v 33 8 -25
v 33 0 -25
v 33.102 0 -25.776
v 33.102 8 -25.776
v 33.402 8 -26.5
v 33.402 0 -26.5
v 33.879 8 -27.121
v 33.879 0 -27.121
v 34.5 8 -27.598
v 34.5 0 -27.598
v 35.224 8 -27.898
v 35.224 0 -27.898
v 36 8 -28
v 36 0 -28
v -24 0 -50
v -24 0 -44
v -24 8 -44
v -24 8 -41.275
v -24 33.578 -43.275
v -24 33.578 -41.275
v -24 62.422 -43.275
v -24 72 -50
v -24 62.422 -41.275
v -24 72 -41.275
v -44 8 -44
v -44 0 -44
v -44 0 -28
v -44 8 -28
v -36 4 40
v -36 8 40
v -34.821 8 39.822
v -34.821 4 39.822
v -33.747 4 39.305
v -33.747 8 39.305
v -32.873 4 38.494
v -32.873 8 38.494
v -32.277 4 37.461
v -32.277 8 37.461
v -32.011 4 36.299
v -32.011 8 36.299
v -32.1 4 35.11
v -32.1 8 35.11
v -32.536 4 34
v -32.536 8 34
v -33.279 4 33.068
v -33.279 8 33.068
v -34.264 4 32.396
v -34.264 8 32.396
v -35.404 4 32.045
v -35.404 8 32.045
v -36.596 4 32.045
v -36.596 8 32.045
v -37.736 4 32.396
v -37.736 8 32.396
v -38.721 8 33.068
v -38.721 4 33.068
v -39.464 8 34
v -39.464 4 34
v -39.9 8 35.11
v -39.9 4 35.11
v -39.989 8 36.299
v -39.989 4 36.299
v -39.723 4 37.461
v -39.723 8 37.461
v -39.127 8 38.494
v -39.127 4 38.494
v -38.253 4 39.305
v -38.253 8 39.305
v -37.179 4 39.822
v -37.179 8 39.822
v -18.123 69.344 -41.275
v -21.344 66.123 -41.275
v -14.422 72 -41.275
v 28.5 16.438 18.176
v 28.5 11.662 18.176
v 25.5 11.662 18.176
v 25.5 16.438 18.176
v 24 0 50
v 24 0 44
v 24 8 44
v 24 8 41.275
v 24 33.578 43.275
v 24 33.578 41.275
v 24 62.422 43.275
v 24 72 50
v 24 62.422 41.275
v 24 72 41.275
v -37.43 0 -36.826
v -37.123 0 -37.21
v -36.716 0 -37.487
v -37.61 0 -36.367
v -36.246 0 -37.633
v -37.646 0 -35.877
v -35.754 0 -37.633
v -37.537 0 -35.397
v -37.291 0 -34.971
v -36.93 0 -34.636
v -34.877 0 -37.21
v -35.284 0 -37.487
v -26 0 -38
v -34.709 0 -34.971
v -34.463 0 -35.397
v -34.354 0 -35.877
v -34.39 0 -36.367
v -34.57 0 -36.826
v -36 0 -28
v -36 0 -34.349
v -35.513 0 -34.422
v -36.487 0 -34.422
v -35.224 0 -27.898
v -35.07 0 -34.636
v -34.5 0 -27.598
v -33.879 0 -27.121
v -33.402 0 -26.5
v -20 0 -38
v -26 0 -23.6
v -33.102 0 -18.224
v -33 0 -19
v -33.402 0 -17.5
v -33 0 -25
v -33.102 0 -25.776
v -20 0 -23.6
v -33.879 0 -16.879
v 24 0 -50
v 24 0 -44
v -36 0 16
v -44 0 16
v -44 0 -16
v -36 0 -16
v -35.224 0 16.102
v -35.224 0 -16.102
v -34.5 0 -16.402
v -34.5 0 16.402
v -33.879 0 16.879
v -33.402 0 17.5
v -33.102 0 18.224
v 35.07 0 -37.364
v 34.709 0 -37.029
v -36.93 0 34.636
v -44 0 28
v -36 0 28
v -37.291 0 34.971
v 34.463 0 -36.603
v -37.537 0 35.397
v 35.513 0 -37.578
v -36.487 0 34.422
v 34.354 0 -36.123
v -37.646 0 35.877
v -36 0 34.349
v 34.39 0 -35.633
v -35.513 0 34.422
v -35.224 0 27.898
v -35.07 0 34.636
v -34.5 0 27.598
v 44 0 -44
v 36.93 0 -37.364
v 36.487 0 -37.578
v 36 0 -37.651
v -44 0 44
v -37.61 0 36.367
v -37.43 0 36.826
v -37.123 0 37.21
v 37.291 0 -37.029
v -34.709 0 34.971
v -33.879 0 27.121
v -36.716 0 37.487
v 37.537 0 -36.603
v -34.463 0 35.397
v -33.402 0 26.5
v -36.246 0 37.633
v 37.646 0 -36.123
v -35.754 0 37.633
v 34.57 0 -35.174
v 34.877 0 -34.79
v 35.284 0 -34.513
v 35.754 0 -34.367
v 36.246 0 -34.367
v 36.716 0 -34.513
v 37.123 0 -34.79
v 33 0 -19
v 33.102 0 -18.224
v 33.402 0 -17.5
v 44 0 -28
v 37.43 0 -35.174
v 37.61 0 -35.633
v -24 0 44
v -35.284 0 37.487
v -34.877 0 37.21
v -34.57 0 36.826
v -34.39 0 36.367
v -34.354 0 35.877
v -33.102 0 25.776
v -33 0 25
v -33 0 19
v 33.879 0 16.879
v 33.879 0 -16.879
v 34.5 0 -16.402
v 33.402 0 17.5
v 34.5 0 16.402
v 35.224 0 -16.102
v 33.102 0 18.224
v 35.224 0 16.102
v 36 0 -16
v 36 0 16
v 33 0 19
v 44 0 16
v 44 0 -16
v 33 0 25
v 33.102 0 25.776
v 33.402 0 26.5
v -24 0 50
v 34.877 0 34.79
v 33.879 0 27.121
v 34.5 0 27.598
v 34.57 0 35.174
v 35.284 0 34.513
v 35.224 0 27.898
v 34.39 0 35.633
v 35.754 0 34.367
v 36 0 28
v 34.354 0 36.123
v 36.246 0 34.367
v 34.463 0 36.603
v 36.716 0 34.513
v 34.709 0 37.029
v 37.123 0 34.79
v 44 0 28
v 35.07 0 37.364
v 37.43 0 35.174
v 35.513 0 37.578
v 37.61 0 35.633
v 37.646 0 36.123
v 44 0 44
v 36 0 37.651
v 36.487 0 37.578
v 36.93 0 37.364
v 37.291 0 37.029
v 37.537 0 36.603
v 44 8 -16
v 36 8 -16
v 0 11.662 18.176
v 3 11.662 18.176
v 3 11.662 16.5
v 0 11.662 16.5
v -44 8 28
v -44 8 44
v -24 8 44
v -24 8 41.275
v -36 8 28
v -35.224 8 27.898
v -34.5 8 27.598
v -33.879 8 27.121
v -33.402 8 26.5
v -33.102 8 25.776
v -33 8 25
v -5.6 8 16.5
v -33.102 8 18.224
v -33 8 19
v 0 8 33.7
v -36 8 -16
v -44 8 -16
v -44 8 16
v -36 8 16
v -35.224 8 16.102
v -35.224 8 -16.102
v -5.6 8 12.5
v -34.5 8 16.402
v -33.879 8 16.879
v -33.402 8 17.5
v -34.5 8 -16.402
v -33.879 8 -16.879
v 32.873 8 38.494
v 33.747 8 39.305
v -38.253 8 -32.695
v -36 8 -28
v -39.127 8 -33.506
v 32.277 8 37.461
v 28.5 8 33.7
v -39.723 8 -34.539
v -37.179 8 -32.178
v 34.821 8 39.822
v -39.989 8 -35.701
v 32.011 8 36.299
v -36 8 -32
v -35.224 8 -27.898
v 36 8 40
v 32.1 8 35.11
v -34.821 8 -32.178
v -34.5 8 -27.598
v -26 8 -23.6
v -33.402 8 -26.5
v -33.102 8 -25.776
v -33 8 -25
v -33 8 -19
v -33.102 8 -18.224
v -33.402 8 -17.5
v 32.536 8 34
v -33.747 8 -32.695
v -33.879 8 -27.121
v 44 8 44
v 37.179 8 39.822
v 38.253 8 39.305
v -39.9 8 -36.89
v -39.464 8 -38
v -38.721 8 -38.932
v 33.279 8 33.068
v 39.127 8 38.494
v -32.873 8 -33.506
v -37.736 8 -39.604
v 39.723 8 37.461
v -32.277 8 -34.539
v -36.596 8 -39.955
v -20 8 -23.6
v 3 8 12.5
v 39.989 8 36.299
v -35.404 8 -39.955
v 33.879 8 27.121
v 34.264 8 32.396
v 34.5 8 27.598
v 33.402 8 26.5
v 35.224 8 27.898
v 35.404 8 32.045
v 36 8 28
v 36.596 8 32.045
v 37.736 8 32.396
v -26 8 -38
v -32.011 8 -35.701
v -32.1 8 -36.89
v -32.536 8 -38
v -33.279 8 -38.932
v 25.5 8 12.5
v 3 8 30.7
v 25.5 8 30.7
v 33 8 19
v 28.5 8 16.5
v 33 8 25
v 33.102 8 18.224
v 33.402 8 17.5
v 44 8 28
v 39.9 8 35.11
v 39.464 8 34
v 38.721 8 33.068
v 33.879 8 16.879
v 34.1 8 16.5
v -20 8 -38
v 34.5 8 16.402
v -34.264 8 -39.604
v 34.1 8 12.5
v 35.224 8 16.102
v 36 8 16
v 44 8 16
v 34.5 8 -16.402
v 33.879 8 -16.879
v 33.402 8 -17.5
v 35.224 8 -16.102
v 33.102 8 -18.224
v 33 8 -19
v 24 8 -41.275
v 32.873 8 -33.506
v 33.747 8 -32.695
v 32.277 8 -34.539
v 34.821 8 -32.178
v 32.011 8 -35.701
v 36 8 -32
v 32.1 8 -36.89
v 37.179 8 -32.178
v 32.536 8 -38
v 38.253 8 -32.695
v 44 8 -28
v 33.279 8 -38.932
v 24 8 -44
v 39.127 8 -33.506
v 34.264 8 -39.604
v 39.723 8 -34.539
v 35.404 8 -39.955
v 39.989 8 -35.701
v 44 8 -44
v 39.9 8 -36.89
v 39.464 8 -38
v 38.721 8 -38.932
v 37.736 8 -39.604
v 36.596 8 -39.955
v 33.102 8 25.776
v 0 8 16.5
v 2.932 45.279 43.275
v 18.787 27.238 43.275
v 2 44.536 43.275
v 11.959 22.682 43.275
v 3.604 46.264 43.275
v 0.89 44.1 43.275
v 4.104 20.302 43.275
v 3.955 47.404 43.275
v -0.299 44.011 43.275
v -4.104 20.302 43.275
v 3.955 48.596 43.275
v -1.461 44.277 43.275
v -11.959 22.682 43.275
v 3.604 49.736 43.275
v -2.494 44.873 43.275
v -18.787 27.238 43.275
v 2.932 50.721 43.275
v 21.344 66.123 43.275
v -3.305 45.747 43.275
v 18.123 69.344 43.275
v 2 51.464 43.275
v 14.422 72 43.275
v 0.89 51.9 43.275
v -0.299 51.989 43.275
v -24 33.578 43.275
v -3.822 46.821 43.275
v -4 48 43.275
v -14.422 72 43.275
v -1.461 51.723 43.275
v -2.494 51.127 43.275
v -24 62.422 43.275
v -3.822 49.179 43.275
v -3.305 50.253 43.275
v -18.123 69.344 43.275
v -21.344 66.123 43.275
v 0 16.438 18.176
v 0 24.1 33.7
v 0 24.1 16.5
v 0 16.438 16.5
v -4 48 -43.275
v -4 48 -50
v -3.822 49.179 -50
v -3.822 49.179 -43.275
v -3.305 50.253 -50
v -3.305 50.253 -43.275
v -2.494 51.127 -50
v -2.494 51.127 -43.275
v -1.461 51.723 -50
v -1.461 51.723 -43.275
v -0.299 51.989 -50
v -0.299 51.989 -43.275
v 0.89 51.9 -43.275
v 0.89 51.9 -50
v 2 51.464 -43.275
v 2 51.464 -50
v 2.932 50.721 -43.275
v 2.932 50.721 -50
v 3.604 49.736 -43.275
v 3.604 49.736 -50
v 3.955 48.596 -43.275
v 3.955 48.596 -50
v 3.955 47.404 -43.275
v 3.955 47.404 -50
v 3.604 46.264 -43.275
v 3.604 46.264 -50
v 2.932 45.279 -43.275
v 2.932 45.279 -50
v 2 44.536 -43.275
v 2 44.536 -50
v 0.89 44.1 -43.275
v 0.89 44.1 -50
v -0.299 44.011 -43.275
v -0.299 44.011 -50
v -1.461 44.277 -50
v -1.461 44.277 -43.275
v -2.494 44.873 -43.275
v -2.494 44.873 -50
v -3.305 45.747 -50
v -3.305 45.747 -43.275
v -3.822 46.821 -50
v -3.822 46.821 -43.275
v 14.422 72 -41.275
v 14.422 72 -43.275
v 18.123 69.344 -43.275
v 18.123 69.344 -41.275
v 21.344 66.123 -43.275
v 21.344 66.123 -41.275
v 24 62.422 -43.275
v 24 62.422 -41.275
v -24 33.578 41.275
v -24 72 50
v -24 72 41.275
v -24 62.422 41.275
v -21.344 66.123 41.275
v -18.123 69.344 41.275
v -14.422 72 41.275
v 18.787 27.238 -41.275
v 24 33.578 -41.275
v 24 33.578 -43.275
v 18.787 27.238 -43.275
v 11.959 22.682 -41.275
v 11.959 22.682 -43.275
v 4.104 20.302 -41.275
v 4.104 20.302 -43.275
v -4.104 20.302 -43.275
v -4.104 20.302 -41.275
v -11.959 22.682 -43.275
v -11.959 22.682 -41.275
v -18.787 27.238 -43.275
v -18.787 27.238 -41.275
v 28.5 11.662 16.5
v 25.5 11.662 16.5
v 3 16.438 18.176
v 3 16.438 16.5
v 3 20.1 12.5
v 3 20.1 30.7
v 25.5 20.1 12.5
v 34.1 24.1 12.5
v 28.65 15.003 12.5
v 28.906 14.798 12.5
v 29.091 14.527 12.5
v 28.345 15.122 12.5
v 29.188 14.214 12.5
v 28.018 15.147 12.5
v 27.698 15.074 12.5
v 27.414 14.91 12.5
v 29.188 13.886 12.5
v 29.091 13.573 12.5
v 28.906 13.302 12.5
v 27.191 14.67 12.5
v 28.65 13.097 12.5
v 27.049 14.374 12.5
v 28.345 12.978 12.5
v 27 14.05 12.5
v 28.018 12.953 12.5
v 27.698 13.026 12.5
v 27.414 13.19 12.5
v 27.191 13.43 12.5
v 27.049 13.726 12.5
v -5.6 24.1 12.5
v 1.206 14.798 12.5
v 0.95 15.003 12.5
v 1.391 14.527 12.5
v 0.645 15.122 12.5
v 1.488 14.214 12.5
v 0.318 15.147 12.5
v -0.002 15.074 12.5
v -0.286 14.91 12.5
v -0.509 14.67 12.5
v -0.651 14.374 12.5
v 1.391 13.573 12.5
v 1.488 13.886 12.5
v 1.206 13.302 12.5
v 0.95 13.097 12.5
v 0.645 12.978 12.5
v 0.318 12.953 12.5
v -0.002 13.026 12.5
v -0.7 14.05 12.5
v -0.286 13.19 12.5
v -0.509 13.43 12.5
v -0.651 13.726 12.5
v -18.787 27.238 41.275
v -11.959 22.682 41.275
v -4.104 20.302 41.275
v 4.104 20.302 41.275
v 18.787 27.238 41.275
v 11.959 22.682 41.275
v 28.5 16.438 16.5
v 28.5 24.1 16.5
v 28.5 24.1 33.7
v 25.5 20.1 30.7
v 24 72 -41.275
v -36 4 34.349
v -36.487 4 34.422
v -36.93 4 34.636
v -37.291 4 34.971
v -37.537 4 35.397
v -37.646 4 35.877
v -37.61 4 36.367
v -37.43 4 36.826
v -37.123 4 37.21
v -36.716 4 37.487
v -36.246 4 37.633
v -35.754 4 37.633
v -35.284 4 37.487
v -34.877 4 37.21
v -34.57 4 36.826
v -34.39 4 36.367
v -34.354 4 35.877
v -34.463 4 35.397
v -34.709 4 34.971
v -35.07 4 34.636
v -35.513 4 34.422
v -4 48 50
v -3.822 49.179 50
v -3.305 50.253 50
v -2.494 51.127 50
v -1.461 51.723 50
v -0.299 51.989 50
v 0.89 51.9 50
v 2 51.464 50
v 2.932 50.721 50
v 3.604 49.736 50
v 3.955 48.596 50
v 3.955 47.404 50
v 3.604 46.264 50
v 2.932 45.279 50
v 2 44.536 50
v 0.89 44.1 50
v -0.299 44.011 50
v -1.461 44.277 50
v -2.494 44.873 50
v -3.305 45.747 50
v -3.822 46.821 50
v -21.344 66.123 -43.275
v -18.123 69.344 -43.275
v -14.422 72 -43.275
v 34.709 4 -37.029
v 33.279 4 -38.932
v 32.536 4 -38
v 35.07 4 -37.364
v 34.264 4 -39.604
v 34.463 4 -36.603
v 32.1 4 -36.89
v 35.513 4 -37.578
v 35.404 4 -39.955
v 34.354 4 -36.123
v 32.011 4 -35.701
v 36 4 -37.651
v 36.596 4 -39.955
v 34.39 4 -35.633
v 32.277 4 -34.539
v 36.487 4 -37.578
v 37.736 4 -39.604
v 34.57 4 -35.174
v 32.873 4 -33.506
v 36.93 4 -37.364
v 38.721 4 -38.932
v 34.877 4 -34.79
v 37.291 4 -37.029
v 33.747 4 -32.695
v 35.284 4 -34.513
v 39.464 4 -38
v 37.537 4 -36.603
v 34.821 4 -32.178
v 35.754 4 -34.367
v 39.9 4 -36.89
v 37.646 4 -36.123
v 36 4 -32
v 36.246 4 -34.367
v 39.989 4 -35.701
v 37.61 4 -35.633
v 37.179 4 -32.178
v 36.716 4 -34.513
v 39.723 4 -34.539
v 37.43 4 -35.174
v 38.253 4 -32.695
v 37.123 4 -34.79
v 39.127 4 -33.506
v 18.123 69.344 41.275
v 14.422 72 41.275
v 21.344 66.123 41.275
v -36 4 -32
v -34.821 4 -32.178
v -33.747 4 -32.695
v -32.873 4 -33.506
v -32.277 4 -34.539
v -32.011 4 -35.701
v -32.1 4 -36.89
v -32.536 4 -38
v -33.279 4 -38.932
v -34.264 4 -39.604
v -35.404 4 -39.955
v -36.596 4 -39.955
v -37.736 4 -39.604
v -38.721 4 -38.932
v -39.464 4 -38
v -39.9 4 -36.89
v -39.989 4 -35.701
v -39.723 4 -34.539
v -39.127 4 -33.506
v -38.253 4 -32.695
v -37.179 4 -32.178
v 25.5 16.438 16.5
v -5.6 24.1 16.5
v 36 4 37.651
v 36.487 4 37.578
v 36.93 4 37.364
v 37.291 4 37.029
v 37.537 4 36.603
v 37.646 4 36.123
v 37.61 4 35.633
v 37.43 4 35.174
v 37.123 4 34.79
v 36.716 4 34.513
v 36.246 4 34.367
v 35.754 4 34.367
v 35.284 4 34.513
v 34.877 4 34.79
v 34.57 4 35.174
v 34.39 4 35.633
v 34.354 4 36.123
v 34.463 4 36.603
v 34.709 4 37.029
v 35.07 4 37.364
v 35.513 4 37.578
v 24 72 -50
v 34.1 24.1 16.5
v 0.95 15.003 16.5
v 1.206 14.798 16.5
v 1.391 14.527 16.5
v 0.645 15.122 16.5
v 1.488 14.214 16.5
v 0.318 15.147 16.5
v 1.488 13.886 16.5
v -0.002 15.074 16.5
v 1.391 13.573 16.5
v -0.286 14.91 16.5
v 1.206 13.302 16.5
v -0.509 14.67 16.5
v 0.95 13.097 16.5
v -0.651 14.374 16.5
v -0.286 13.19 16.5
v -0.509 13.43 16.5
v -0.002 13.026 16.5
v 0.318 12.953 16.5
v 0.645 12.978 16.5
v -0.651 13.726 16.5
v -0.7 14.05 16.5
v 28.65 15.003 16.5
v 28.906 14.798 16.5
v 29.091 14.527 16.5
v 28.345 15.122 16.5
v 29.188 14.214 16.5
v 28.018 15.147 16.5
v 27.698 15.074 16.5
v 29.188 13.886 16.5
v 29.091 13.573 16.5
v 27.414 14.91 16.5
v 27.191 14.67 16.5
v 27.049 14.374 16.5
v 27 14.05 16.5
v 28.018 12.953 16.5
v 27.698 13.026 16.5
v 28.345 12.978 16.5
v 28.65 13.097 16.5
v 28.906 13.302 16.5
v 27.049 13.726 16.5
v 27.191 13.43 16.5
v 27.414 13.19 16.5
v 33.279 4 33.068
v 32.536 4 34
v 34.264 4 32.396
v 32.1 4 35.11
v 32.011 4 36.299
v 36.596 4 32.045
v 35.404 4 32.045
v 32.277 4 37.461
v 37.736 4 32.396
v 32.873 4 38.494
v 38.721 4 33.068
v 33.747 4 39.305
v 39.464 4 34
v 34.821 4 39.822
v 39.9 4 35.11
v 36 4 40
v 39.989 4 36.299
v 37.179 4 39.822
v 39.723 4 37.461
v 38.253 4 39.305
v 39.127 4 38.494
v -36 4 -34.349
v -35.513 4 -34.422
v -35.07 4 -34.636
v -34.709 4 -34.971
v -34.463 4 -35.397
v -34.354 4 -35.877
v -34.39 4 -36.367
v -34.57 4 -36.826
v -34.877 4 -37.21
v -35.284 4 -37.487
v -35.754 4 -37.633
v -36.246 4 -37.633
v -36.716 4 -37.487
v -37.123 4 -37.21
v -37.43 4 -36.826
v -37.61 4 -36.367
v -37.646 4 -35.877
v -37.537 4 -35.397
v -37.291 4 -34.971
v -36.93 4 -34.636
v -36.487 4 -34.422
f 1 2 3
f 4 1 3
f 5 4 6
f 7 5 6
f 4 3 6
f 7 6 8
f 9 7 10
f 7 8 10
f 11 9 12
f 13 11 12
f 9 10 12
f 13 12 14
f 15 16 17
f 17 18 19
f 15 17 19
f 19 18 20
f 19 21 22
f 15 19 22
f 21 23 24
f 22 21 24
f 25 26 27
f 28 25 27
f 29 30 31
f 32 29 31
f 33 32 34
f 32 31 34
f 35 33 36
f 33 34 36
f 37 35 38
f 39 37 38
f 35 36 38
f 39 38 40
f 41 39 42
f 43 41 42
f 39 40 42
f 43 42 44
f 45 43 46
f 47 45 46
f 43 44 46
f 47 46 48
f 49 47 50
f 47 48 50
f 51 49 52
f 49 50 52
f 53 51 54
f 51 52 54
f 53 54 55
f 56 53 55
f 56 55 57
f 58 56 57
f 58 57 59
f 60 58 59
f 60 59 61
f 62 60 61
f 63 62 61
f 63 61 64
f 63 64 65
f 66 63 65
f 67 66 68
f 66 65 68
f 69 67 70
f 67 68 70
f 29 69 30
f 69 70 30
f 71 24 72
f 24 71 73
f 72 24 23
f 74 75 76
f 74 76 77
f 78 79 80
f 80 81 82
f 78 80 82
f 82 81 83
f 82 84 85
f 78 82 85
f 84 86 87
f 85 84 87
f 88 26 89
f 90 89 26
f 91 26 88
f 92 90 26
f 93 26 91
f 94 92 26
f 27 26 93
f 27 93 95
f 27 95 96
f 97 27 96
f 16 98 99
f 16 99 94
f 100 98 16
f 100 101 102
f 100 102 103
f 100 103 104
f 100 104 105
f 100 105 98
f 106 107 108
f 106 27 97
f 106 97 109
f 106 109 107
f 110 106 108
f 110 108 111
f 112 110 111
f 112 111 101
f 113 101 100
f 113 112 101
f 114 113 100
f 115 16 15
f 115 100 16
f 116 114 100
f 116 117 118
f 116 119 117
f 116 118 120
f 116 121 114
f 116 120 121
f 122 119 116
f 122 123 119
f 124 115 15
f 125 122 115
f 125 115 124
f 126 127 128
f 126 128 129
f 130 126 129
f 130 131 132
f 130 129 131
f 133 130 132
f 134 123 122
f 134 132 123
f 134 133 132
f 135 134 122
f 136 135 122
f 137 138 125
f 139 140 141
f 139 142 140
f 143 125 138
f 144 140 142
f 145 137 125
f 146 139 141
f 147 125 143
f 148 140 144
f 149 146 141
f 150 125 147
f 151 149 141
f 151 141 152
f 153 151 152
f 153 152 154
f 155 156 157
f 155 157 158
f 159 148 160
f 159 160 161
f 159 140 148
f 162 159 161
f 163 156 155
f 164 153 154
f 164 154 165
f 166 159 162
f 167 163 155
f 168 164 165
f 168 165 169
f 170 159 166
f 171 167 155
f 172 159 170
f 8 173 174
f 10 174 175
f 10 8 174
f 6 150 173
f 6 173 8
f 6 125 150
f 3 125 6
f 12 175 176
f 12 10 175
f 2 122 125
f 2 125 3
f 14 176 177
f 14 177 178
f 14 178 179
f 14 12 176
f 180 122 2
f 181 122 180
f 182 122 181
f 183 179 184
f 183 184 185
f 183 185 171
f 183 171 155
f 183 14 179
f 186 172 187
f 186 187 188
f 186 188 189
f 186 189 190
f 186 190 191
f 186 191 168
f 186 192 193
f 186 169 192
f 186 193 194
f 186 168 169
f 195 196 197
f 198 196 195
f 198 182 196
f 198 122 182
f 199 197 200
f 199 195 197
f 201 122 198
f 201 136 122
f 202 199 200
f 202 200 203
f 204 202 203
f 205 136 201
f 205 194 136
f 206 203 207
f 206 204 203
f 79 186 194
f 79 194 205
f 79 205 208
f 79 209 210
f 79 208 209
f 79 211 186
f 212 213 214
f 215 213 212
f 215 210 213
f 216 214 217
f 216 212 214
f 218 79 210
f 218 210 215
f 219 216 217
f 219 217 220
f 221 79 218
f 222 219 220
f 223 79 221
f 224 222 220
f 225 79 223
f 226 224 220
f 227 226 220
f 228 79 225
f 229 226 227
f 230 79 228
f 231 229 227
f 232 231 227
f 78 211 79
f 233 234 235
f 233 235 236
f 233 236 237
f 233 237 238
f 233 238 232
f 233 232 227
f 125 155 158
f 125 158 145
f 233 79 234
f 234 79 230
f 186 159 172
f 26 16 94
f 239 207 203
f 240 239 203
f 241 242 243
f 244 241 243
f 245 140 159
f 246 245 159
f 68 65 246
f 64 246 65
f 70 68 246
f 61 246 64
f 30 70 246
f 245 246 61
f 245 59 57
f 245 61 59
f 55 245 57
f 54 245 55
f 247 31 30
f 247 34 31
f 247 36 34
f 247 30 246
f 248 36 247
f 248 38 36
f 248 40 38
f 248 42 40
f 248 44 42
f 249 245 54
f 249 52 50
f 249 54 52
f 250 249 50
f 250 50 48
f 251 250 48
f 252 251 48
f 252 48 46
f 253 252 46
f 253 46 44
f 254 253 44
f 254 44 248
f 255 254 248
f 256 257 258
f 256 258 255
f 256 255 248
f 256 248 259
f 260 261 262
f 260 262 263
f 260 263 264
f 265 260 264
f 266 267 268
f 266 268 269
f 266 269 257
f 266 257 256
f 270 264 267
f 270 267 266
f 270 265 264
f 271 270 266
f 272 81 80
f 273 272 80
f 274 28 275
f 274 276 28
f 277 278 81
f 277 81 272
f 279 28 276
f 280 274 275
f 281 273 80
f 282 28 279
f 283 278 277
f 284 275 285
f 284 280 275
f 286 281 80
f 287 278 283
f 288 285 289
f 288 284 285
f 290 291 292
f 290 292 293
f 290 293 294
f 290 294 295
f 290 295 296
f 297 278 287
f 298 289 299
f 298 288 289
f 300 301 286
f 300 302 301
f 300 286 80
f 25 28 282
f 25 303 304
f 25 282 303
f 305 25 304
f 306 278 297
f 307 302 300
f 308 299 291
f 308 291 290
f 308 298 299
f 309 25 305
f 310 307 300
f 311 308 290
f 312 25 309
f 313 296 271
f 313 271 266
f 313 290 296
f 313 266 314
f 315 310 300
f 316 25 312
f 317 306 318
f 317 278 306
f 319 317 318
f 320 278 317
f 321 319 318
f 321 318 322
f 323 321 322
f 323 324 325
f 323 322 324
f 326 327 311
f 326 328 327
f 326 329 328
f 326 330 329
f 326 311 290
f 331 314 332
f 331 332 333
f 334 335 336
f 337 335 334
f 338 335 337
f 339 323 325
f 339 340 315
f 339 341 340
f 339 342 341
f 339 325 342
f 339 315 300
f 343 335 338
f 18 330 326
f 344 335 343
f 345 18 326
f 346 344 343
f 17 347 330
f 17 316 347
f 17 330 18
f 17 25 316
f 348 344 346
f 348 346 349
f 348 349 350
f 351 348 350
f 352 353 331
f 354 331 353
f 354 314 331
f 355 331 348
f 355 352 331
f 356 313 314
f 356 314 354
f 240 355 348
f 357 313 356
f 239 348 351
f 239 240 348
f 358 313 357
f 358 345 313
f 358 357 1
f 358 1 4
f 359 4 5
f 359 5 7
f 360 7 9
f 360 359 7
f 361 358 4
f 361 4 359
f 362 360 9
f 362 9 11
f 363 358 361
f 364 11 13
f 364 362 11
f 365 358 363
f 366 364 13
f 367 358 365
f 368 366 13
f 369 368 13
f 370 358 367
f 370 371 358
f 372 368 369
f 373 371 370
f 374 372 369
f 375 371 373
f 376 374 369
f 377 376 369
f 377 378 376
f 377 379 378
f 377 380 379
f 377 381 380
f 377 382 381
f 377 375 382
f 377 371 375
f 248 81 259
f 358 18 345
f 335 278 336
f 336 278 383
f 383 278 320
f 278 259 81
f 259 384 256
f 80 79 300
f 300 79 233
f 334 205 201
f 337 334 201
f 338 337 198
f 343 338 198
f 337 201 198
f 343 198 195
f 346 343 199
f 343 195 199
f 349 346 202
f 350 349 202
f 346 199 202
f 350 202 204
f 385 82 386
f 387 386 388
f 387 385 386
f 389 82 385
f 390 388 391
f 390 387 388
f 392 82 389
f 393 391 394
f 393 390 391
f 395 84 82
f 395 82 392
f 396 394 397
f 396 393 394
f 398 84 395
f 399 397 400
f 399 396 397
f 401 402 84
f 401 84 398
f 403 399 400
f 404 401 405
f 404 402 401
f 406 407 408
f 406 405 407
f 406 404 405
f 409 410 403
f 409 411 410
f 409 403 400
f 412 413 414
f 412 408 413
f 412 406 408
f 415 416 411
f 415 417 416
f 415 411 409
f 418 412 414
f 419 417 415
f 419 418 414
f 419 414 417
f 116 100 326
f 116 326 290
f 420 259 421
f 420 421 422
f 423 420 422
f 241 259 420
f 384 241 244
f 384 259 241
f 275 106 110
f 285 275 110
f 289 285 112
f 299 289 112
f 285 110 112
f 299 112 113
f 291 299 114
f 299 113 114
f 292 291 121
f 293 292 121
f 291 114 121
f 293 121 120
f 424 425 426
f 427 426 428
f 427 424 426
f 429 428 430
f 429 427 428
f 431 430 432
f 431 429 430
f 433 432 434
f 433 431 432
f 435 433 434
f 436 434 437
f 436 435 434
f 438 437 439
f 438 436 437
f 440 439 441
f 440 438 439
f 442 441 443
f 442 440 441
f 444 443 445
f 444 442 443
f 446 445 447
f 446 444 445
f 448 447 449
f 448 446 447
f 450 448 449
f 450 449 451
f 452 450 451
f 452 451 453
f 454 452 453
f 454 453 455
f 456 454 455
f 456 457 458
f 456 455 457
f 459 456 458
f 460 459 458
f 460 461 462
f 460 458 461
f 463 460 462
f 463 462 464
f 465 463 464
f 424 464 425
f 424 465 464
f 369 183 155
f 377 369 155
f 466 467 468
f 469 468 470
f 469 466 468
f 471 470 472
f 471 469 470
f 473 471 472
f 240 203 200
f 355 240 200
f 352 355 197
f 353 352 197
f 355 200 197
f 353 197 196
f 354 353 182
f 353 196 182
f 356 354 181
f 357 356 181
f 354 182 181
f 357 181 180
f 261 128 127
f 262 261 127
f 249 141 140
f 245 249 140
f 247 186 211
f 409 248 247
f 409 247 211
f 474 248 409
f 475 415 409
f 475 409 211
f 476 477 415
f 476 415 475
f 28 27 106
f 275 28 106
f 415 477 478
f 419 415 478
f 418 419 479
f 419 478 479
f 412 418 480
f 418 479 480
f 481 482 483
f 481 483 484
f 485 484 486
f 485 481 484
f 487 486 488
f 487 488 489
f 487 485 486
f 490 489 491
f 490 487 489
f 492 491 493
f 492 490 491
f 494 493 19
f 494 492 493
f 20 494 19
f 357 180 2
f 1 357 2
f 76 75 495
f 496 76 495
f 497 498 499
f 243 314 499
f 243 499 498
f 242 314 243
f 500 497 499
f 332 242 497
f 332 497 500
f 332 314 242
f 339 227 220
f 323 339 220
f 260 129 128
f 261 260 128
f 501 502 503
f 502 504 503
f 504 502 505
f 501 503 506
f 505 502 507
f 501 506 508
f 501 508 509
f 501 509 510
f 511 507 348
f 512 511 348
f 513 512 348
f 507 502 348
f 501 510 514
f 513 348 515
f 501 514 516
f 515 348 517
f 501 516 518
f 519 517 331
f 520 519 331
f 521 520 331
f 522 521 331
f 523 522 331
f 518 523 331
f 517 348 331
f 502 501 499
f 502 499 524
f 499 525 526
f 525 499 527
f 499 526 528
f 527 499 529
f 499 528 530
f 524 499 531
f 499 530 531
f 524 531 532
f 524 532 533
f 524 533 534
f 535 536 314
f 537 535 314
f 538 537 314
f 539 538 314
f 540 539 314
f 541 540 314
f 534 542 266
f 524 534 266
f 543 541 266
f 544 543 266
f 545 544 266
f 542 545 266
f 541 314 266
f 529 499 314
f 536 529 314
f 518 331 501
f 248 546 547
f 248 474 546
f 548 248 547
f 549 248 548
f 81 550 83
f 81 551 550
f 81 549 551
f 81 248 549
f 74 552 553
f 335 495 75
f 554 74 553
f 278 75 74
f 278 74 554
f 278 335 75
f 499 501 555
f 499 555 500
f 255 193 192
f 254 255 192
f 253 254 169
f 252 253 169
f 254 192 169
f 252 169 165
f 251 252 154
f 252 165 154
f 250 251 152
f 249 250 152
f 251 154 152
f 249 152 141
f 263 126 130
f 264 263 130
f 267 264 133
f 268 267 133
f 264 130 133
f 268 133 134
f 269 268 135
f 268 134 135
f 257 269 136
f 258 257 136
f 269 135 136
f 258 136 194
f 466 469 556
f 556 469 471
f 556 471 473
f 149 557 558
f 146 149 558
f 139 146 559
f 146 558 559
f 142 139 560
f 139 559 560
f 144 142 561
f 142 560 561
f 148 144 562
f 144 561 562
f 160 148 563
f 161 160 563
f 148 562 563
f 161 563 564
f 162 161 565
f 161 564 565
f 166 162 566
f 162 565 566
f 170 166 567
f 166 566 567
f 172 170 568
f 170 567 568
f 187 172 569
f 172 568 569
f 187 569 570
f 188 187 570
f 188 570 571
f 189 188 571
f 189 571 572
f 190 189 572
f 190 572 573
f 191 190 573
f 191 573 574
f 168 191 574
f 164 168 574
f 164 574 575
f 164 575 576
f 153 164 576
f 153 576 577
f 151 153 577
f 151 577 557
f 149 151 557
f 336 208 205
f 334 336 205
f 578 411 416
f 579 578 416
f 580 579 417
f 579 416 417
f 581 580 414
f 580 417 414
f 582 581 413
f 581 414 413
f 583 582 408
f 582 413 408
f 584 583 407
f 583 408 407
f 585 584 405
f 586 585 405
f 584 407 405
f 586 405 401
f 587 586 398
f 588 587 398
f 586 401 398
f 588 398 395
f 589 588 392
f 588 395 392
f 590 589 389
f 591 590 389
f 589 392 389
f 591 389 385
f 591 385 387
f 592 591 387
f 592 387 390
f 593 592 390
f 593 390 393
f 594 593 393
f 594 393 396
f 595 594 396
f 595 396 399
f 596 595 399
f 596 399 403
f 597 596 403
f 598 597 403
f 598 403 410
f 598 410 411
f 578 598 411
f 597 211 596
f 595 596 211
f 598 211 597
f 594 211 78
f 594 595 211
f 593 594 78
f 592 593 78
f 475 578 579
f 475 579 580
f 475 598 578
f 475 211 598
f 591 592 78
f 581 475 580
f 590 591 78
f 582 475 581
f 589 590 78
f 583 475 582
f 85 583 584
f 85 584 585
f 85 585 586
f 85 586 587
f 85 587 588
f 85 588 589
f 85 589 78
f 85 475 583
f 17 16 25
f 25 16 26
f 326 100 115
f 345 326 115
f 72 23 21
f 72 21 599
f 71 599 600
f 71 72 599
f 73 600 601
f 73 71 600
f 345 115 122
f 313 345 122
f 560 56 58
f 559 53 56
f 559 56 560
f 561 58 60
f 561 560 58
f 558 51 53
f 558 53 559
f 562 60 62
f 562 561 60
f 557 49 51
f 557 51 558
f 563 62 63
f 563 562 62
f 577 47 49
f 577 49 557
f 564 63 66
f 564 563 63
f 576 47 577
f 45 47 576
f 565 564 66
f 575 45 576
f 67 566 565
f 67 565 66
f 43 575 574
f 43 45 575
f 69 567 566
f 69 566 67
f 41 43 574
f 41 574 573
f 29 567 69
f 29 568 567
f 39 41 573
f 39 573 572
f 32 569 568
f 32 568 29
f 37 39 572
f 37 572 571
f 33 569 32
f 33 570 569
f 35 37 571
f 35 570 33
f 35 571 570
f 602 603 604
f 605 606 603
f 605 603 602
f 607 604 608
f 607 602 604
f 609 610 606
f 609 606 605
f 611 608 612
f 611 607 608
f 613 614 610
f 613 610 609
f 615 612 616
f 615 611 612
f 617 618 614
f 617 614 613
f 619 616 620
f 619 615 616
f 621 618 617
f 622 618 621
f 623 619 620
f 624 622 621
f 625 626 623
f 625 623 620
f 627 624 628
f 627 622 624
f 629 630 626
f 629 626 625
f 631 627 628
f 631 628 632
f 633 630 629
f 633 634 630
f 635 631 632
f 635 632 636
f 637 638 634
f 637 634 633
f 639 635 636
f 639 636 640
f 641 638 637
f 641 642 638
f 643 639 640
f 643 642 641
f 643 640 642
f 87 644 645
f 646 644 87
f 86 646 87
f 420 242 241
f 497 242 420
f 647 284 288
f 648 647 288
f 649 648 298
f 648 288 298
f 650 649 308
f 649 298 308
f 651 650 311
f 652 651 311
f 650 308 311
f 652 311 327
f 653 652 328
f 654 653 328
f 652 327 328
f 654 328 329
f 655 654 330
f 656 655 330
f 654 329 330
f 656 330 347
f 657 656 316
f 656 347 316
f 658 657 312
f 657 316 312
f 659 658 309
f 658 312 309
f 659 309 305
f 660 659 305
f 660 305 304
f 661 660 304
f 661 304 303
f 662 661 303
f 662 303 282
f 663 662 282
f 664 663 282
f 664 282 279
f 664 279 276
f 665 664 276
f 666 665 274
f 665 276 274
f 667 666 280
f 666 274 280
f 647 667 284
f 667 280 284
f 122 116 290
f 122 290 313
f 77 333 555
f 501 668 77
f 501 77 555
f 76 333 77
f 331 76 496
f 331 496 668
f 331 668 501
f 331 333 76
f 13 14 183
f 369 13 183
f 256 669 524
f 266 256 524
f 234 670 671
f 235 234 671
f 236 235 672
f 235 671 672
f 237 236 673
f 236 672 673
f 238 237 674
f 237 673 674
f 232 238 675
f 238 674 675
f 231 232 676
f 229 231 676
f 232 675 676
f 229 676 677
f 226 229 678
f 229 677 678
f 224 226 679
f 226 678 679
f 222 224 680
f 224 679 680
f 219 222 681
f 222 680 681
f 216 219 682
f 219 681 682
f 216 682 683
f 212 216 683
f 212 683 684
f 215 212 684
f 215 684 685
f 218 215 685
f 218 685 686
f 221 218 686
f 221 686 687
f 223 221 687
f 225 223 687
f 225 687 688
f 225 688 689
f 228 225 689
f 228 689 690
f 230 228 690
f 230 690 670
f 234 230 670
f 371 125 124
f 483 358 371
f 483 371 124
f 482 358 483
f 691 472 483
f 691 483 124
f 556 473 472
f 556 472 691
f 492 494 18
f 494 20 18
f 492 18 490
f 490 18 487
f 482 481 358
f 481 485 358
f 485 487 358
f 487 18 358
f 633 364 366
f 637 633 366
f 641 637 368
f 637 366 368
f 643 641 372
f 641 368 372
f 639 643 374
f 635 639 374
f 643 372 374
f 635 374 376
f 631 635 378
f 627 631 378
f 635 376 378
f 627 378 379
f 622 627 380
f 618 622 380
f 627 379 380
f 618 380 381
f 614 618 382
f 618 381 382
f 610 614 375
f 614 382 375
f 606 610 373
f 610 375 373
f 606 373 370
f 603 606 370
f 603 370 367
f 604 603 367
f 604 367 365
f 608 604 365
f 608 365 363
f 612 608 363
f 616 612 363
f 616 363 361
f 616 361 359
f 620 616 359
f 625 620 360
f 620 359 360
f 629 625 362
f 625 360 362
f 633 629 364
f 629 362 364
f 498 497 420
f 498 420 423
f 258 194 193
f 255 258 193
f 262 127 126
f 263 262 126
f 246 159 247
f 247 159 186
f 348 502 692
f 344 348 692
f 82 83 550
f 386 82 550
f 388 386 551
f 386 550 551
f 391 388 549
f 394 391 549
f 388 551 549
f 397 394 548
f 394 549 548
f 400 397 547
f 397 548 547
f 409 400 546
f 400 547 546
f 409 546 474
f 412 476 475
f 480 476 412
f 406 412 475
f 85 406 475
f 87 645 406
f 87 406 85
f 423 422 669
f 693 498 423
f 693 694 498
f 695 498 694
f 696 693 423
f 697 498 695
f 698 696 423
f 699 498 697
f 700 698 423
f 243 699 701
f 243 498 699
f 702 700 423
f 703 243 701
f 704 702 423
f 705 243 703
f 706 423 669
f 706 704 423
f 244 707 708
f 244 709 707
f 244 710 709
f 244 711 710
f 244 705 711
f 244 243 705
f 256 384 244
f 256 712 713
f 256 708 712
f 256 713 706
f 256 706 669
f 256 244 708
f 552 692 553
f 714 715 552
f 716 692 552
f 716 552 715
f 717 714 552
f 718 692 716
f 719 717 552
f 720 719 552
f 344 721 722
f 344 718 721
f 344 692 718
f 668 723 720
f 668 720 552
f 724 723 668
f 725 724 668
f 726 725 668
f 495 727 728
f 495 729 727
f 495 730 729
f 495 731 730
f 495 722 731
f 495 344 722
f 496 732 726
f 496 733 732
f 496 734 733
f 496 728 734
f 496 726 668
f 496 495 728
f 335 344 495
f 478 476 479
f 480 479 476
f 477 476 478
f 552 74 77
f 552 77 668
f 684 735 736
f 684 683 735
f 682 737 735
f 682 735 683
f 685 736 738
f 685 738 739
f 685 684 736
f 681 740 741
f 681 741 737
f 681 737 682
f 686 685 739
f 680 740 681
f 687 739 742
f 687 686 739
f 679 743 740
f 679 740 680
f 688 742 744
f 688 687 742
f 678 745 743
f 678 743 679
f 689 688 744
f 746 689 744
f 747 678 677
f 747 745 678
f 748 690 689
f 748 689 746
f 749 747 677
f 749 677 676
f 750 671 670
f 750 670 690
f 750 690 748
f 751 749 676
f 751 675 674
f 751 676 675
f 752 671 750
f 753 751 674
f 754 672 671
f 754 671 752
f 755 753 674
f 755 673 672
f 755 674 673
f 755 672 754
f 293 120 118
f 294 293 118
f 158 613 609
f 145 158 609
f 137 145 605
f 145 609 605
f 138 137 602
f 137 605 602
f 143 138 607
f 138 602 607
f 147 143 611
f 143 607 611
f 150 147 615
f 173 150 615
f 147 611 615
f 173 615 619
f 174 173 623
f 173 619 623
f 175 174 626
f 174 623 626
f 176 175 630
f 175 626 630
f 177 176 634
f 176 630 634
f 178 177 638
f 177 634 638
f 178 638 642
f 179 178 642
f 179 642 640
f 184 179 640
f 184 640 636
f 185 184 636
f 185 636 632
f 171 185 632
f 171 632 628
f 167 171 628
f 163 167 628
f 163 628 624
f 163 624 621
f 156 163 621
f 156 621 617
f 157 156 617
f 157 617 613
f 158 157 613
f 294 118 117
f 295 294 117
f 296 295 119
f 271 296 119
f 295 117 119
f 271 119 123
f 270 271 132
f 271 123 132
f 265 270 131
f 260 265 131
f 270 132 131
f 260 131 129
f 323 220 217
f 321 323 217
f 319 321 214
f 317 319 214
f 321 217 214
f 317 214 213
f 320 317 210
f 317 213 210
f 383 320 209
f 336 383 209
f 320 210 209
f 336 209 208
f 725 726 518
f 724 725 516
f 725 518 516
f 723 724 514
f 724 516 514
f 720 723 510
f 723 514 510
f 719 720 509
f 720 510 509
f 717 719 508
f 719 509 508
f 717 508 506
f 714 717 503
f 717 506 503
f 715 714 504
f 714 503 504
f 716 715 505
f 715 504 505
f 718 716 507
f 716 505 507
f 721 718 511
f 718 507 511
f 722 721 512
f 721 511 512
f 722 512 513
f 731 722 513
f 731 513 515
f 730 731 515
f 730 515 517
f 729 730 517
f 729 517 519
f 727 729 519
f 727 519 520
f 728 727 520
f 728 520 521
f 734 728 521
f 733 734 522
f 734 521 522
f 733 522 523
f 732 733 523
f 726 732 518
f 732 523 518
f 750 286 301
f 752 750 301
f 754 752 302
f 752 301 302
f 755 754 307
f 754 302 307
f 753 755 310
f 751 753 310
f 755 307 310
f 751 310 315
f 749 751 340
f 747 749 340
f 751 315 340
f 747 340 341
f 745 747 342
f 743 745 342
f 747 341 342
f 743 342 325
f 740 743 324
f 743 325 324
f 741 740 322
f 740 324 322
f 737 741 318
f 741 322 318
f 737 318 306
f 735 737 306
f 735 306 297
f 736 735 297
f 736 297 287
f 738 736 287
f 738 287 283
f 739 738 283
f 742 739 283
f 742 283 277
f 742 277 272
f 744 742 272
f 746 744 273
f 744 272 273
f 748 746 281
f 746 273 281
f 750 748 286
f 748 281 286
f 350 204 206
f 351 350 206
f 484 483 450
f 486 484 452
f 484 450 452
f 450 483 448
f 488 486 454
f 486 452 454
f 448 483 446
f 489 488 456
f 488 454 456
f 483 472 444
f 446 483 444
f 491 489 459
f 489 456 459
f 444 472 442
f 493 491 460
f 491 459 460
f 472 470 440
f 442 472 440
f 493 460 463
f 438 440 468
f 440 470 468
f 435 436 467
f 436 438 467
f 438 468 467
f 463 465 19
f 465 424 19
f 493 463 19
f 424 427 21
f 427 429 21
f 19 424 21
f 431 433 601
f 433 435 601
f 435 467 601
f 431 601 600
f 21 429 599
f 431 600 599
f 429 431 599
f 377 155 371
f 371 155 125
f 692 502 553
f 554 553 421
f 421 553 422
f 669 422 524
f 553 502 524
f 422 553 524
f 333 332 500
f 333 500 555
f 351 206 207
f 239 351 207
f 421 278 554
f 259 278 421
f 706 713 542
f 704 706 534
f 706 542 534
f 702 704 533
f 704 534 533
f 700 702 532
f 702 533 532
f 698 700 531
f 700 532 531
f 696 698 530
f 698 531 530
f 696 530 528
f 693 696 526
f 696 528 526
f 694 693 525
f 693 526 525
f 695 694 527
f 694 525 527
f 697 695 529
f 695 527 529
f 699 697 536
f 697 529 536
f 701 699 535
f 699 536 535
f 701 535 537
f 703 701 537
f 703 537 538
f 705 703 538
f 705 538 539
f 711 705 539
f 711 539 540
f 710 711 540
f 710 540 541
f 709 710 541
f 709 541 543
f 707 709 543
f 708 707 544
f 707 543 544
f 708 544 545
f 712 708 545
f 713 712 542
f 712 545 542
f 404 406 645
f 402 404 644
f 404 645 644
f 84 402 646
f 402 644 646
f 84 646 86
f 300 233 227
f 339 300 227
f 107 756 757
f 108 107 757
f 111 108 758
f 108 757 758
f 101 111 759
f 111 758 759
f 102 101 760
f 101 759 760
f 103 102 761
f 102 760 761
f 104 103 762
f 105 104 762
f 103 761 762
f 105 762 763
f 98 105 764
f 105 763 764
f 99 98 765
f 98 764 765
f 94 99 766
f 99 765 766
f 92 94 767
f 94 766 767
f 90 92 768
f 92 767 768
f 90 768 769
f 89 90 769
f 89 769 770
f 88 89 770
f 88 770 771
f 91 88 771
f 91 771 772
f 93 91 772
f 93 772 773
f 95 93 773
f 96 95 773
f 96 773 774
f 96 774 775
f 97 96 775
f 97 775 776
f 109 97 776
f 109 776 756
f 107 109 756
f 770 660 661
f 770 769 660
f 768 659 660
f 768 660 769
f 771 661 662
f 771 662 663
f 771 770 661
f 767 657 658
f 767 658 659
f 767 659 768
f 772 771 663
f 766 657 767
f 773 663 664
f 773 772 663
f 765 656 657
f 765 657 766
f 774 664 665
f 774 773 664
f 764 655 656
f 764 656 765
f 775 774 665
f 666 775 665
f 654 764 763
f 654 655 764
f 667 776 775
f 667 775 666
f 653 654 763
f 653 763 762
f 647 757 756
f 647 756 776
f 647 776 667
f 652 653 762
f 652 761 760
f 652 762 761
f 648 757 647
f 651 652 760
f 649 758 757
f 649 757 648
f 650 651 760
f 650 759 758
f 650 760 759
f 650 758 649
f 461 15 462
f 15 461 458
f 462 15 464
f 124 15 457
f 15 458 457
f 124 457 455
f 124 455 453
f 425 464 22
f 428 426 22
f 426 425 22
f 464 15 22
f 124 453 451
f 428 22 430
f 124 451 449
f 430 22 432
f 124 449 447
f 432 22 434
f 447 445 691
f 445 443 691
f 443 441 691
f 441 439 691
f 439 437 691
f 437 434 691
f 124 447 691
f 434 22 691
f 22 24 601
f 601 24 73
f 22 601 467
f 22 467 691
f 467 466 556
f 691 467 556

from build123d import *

# Parameters (mm, degrees)
BOSS_EXTRUDE1_DEPTH = 8
SKETCH2_R           = 1.651
CUT_EXTRUDE1_DEPTH  = 63.737548565
SKETCH3_R           = 4
CUT_EXTRUDE2_DEPTH  = 4
BOSS_EXTRUDE2_DEPTH = 12.1
BOSS_EXTRUDE3_DEPTH = 4
SKETCH6_R           = 1.1
CUT_EXTRUDE4_DEPTH  = 4
SKETCH7_W           = 1.6764
SKETCH7_H           = 4.7752
CUT_EXTRUDE5_DEPTH  = 89.164959026
SKETCH8_W           = 48
SKETCH8_H           = 2.725
BOSS_EXTRUDE4_DEPTH = 64
SKETCH9_W           = 48
SKETCH9_H           = 72
BOSS_EXTRUDE5_DEPTH = 6
SKETCH10_R          = 28
CUT_EXTRUDE6_DEPTH  = 2
SKETCH12_R          = 4
CUT_EXTRUDE7_DEPTH  = 126.778478386
SKETCH13_W          = 6
SKETCH13_H          = 14.4
CUT_EXTRUDE8_DEPTH  = 99.081598682


with BuildPart() as part:
    # Sketch1 → Boss-Extrude1 (new body)
    with BuildSketch(Plane(origin=(0, 0, 0), x_dir=(1, 0, 0), z_dir=(0, 1, 0))):
        with BuildLine():
            Line((-44, 28), (-36, 28))
            ThreePointArc((-36, 28), (-33.878679656, 27.121320344), (-33, 25))
            Line((-33, 25), (-33, 19))
            ThreePointArc((-33, 19), (-33.878679656, 16.878679656), (-36, 16))
            Line((-36, 16), (-44, 16))
            Line((-44, 16), (-44, -16))
            Line((-44, -16), (-36, -16))
            ThreePointArc((-36, -16), (-33.878679656, -16.878679656), (-33, -19))
            Line((-33, -19), (-33, -25))
            ThreePointArc((-33, -25), (-33.878679656, -27.121320344), (-36, -28))
            Line((-36, -28), (-44, -28))
            Line((-44, -28), (-44, -44))
            Line((-44, -44), (44, -44))
            Line((44, -44), (44, -28))
            Line((44, -28), (36, -28))
            ThreePointArc((36, -28), (33.878679656, -27.121320344), (33, -25))
            Line((33, -25), (33, -19))
            ThreePointArc((33, -19), (33.878679656, -16.878679656), (36, -16))
            Line((36, -16), (44, -16))
            Line((44, -16), (44, 16))
            Line((44, 16), (36, 16))
            ThreePointArc((36, 16), (33.878679656, 16.878679656), (33, 19))
            Line((33, 19), (33, 25))
            ThreePointArc((33, 25), (33.878679656, 27.121320344), (36, 28))
            Line((36, 28), (44, 28))
            Line((44, 28), (44, 44))
            Line((44, 44), (-44, 44))
            Line((-44, 44), (-44, 28))
        make_face()
    extrude(amount=BOSS_EXTRUDE1_DEPTH)

    # Sketch2 → Cut-Extrude1 (cut, through all)
    with BuildSketch(Plane(origin=(0, 8, 0), x_dir=(1, 0, 0), z_dir=(0, 1, 0))):
        with Locations(Location((-36, 36, 0), (0, 0, 270))):
            Circle(SKETCH2_R)
        with Locations(Location((36, 36, 0), (0, 0, 90))):
            Circle(SKETCH2_R)
        with Locations(Location((36, -36, 0), (0, 0, 270))):
            Circle(SKETCH2_R)
        with Locations(Location((-36, -36, 0), (0, 0, 90))):
            Circle(SKETCH2_R)
    extrude(amount=-CUT_EXTRUDE1_DEPTH, mode=Mode.SUBTRACT)

    # Sketch3 → Cut-Extrude2 (cut)
    with BuildSketch(Plane(origin=(0, 8, 0), x_dir=(1, 0, 0), z_dir=(0, 1, 0))):
        with Locations(Location((-36, 36, 0), (0, 0, 270))):
            Circle(SKETCH3_R)
        with Locations(Location((36, 36, 0), (0, 0, 270))):
            Circle(SKETCH3_R)
        with Locations(Location((36, -36, 0), (0, 0, 270))):
            Circle(SKETCH3_R)
        with Locations(Location((-36, -36, 0), (0, 0, 270))):
            Circle(SKETCH3_R)
    extrude(amount=-CUT_EXTRUDE2_DEPTH, mode=Mode.SUBTRACT)

    # Sketch4 → Boss-Extrude2 (add)
    with BuildSketch(Plane(origin=(0, 8, 0), x_dir=(1, 0, 0), z_dir=(0, 1, 0))):
        Polygon((0, -12.5), (3, -12.5), (3, -30.7), (25.5, -30.7), (25.5, -12.5), (28.5, -12.5), (34.1, -12.5), (34.1, -16.5), (28.5, -16.5), (28.5, -33.7), (0, -33.7), (0, -16.5), (-5.6, -16.5), (-5.6, -12.5), align=None)
    extrude(amount=BOSS_EXTRUDE2_DEPTH)

    # Sketch5 → Boss-Extrude3 (add)
    with BuildSketch(Plane(origin=(0, 20.1, 0), x_dir=(1, 0, 0), z_dir=(0, 1, 0))):
        Polygon((3, -12.5), (25.5, -12.5), (34.1, -12.5), (34.1, -16.5), (28.5, -16.5), (28.5, -33.7), (0, -33.7), (0, -16.5), (-5.6, -16.5), (-5.6, -12.5), align=None)
    extrude(amount=BOSS_EXTRUDE3_DEPTH)

    # Sketch6 → Cut-Extrude4 (cut)
    with BuildSketch(Plane(origin=(0, 0, 12.5), x_dir=(-1, 0, 0), z_dir=(0, 0, -1))):
        with Locations((-28.1, 14.05)):
            Circle(SKETCH6_R)
        with Locations((-0.4, 14.05)):
            Circle(SKETCH6_R)
    extrude(amount=-CUT_EXTRUDE4_DEPTH, mode=Mode.SUBTRACT)

    # Sketch7 → Cut-Extrude5 (cut, through all)
    with BuildSketch(Plane(origin=(28.5, 0, 0), x_dir=(0, 0, -1), z_dir=(1, 0, 0))):
        with Locations((-17.3382, 14.05)):
            Rectangle(SKETCH7_W, SKETCH7_H)
    extrude(amount=-CUT_EXTRUDE5_DEPTH, mode=Mode.SUBTRACT)

    # Sketch8 → Boss-Extrude4 (add)
    with BuildSketch(Plane(origin=(0, 8, 0), x_dir=(1, 0, 0), z_dir=(0, 1, 0))):
        with Locations((0, 42.6375)):
            Rectangle(SKETCH8_W, SKETCH8_H)
        with Locations((0, -42.6375)):
            Rectangle(SKETCH8_W, SKETCH8_H)
    extrude(amount=BOSS_EXTRUDE4_DEPTH)

    # Sketch9 → Boss-Extrude5 (add)
    with BuildSketch(Plane.XY.offset(44)):
        with Locations((0, 36)):
            Rectangle(SKETCH9_W, SKETCH9_H)
    boss_extrude5 = extrude(amount=BOSS_EXTRUDE5_DEPTH)

    # Mirror1: Boss-Extrude5 across plane
    add(boss_extrude5.mirror(Plane.XY))

    # Sketch10 → Cut-Extrude6 (cut)
    with BuildSketch(Plane(origin=(0, 0, 41.275), x_dir=(-1, 0, 0), z_dir=(0, 0, -1))):
        with Locations((0, 48)):
            Circle(SKETCH10_R)
    cut_extrude6 = extrude(amount=-CUT_EXTRUDE6_DEPTH, mode=Mode.SUBTRACT)

    # Sketch12 → Cut-Extrude7 (cut, through all)
    with BuildSketch(Plane(origin=(0, 0, 43.275), x_dir=(-1, 0, 0), z_dir=(0, 0, -1))):
        with Locations((0, 48)):
            Circle(SKETCH12_R)
    cut_extrude7 = extrude(amount=-CUT_EXTRUDE7_DEPTH, mode=Mode.SUBTRACT)

    # Mirror2: Cut-Extrude6, Cut-Extrude7 across plane
    add(cut_extrude6.mirror(Plane.XY), mode=Mode.SUBTRACT)
    add(cut_extrude7.mirror(Plane.XY), mode=Mode.SUBTRACT)

    # Sketch13 → Cut-Extrude8 (cut, through all)
    with BuildSketch(Plane.XZ):
        with Locations((-23, -30.8)):
            Rectangle(SKETCH13_W, SKETCH13_H)
    extrude(amount=-CUT_EXTRUDE8_DEPTH, mode=Mode.SUBTRACT)


solid = part.part
